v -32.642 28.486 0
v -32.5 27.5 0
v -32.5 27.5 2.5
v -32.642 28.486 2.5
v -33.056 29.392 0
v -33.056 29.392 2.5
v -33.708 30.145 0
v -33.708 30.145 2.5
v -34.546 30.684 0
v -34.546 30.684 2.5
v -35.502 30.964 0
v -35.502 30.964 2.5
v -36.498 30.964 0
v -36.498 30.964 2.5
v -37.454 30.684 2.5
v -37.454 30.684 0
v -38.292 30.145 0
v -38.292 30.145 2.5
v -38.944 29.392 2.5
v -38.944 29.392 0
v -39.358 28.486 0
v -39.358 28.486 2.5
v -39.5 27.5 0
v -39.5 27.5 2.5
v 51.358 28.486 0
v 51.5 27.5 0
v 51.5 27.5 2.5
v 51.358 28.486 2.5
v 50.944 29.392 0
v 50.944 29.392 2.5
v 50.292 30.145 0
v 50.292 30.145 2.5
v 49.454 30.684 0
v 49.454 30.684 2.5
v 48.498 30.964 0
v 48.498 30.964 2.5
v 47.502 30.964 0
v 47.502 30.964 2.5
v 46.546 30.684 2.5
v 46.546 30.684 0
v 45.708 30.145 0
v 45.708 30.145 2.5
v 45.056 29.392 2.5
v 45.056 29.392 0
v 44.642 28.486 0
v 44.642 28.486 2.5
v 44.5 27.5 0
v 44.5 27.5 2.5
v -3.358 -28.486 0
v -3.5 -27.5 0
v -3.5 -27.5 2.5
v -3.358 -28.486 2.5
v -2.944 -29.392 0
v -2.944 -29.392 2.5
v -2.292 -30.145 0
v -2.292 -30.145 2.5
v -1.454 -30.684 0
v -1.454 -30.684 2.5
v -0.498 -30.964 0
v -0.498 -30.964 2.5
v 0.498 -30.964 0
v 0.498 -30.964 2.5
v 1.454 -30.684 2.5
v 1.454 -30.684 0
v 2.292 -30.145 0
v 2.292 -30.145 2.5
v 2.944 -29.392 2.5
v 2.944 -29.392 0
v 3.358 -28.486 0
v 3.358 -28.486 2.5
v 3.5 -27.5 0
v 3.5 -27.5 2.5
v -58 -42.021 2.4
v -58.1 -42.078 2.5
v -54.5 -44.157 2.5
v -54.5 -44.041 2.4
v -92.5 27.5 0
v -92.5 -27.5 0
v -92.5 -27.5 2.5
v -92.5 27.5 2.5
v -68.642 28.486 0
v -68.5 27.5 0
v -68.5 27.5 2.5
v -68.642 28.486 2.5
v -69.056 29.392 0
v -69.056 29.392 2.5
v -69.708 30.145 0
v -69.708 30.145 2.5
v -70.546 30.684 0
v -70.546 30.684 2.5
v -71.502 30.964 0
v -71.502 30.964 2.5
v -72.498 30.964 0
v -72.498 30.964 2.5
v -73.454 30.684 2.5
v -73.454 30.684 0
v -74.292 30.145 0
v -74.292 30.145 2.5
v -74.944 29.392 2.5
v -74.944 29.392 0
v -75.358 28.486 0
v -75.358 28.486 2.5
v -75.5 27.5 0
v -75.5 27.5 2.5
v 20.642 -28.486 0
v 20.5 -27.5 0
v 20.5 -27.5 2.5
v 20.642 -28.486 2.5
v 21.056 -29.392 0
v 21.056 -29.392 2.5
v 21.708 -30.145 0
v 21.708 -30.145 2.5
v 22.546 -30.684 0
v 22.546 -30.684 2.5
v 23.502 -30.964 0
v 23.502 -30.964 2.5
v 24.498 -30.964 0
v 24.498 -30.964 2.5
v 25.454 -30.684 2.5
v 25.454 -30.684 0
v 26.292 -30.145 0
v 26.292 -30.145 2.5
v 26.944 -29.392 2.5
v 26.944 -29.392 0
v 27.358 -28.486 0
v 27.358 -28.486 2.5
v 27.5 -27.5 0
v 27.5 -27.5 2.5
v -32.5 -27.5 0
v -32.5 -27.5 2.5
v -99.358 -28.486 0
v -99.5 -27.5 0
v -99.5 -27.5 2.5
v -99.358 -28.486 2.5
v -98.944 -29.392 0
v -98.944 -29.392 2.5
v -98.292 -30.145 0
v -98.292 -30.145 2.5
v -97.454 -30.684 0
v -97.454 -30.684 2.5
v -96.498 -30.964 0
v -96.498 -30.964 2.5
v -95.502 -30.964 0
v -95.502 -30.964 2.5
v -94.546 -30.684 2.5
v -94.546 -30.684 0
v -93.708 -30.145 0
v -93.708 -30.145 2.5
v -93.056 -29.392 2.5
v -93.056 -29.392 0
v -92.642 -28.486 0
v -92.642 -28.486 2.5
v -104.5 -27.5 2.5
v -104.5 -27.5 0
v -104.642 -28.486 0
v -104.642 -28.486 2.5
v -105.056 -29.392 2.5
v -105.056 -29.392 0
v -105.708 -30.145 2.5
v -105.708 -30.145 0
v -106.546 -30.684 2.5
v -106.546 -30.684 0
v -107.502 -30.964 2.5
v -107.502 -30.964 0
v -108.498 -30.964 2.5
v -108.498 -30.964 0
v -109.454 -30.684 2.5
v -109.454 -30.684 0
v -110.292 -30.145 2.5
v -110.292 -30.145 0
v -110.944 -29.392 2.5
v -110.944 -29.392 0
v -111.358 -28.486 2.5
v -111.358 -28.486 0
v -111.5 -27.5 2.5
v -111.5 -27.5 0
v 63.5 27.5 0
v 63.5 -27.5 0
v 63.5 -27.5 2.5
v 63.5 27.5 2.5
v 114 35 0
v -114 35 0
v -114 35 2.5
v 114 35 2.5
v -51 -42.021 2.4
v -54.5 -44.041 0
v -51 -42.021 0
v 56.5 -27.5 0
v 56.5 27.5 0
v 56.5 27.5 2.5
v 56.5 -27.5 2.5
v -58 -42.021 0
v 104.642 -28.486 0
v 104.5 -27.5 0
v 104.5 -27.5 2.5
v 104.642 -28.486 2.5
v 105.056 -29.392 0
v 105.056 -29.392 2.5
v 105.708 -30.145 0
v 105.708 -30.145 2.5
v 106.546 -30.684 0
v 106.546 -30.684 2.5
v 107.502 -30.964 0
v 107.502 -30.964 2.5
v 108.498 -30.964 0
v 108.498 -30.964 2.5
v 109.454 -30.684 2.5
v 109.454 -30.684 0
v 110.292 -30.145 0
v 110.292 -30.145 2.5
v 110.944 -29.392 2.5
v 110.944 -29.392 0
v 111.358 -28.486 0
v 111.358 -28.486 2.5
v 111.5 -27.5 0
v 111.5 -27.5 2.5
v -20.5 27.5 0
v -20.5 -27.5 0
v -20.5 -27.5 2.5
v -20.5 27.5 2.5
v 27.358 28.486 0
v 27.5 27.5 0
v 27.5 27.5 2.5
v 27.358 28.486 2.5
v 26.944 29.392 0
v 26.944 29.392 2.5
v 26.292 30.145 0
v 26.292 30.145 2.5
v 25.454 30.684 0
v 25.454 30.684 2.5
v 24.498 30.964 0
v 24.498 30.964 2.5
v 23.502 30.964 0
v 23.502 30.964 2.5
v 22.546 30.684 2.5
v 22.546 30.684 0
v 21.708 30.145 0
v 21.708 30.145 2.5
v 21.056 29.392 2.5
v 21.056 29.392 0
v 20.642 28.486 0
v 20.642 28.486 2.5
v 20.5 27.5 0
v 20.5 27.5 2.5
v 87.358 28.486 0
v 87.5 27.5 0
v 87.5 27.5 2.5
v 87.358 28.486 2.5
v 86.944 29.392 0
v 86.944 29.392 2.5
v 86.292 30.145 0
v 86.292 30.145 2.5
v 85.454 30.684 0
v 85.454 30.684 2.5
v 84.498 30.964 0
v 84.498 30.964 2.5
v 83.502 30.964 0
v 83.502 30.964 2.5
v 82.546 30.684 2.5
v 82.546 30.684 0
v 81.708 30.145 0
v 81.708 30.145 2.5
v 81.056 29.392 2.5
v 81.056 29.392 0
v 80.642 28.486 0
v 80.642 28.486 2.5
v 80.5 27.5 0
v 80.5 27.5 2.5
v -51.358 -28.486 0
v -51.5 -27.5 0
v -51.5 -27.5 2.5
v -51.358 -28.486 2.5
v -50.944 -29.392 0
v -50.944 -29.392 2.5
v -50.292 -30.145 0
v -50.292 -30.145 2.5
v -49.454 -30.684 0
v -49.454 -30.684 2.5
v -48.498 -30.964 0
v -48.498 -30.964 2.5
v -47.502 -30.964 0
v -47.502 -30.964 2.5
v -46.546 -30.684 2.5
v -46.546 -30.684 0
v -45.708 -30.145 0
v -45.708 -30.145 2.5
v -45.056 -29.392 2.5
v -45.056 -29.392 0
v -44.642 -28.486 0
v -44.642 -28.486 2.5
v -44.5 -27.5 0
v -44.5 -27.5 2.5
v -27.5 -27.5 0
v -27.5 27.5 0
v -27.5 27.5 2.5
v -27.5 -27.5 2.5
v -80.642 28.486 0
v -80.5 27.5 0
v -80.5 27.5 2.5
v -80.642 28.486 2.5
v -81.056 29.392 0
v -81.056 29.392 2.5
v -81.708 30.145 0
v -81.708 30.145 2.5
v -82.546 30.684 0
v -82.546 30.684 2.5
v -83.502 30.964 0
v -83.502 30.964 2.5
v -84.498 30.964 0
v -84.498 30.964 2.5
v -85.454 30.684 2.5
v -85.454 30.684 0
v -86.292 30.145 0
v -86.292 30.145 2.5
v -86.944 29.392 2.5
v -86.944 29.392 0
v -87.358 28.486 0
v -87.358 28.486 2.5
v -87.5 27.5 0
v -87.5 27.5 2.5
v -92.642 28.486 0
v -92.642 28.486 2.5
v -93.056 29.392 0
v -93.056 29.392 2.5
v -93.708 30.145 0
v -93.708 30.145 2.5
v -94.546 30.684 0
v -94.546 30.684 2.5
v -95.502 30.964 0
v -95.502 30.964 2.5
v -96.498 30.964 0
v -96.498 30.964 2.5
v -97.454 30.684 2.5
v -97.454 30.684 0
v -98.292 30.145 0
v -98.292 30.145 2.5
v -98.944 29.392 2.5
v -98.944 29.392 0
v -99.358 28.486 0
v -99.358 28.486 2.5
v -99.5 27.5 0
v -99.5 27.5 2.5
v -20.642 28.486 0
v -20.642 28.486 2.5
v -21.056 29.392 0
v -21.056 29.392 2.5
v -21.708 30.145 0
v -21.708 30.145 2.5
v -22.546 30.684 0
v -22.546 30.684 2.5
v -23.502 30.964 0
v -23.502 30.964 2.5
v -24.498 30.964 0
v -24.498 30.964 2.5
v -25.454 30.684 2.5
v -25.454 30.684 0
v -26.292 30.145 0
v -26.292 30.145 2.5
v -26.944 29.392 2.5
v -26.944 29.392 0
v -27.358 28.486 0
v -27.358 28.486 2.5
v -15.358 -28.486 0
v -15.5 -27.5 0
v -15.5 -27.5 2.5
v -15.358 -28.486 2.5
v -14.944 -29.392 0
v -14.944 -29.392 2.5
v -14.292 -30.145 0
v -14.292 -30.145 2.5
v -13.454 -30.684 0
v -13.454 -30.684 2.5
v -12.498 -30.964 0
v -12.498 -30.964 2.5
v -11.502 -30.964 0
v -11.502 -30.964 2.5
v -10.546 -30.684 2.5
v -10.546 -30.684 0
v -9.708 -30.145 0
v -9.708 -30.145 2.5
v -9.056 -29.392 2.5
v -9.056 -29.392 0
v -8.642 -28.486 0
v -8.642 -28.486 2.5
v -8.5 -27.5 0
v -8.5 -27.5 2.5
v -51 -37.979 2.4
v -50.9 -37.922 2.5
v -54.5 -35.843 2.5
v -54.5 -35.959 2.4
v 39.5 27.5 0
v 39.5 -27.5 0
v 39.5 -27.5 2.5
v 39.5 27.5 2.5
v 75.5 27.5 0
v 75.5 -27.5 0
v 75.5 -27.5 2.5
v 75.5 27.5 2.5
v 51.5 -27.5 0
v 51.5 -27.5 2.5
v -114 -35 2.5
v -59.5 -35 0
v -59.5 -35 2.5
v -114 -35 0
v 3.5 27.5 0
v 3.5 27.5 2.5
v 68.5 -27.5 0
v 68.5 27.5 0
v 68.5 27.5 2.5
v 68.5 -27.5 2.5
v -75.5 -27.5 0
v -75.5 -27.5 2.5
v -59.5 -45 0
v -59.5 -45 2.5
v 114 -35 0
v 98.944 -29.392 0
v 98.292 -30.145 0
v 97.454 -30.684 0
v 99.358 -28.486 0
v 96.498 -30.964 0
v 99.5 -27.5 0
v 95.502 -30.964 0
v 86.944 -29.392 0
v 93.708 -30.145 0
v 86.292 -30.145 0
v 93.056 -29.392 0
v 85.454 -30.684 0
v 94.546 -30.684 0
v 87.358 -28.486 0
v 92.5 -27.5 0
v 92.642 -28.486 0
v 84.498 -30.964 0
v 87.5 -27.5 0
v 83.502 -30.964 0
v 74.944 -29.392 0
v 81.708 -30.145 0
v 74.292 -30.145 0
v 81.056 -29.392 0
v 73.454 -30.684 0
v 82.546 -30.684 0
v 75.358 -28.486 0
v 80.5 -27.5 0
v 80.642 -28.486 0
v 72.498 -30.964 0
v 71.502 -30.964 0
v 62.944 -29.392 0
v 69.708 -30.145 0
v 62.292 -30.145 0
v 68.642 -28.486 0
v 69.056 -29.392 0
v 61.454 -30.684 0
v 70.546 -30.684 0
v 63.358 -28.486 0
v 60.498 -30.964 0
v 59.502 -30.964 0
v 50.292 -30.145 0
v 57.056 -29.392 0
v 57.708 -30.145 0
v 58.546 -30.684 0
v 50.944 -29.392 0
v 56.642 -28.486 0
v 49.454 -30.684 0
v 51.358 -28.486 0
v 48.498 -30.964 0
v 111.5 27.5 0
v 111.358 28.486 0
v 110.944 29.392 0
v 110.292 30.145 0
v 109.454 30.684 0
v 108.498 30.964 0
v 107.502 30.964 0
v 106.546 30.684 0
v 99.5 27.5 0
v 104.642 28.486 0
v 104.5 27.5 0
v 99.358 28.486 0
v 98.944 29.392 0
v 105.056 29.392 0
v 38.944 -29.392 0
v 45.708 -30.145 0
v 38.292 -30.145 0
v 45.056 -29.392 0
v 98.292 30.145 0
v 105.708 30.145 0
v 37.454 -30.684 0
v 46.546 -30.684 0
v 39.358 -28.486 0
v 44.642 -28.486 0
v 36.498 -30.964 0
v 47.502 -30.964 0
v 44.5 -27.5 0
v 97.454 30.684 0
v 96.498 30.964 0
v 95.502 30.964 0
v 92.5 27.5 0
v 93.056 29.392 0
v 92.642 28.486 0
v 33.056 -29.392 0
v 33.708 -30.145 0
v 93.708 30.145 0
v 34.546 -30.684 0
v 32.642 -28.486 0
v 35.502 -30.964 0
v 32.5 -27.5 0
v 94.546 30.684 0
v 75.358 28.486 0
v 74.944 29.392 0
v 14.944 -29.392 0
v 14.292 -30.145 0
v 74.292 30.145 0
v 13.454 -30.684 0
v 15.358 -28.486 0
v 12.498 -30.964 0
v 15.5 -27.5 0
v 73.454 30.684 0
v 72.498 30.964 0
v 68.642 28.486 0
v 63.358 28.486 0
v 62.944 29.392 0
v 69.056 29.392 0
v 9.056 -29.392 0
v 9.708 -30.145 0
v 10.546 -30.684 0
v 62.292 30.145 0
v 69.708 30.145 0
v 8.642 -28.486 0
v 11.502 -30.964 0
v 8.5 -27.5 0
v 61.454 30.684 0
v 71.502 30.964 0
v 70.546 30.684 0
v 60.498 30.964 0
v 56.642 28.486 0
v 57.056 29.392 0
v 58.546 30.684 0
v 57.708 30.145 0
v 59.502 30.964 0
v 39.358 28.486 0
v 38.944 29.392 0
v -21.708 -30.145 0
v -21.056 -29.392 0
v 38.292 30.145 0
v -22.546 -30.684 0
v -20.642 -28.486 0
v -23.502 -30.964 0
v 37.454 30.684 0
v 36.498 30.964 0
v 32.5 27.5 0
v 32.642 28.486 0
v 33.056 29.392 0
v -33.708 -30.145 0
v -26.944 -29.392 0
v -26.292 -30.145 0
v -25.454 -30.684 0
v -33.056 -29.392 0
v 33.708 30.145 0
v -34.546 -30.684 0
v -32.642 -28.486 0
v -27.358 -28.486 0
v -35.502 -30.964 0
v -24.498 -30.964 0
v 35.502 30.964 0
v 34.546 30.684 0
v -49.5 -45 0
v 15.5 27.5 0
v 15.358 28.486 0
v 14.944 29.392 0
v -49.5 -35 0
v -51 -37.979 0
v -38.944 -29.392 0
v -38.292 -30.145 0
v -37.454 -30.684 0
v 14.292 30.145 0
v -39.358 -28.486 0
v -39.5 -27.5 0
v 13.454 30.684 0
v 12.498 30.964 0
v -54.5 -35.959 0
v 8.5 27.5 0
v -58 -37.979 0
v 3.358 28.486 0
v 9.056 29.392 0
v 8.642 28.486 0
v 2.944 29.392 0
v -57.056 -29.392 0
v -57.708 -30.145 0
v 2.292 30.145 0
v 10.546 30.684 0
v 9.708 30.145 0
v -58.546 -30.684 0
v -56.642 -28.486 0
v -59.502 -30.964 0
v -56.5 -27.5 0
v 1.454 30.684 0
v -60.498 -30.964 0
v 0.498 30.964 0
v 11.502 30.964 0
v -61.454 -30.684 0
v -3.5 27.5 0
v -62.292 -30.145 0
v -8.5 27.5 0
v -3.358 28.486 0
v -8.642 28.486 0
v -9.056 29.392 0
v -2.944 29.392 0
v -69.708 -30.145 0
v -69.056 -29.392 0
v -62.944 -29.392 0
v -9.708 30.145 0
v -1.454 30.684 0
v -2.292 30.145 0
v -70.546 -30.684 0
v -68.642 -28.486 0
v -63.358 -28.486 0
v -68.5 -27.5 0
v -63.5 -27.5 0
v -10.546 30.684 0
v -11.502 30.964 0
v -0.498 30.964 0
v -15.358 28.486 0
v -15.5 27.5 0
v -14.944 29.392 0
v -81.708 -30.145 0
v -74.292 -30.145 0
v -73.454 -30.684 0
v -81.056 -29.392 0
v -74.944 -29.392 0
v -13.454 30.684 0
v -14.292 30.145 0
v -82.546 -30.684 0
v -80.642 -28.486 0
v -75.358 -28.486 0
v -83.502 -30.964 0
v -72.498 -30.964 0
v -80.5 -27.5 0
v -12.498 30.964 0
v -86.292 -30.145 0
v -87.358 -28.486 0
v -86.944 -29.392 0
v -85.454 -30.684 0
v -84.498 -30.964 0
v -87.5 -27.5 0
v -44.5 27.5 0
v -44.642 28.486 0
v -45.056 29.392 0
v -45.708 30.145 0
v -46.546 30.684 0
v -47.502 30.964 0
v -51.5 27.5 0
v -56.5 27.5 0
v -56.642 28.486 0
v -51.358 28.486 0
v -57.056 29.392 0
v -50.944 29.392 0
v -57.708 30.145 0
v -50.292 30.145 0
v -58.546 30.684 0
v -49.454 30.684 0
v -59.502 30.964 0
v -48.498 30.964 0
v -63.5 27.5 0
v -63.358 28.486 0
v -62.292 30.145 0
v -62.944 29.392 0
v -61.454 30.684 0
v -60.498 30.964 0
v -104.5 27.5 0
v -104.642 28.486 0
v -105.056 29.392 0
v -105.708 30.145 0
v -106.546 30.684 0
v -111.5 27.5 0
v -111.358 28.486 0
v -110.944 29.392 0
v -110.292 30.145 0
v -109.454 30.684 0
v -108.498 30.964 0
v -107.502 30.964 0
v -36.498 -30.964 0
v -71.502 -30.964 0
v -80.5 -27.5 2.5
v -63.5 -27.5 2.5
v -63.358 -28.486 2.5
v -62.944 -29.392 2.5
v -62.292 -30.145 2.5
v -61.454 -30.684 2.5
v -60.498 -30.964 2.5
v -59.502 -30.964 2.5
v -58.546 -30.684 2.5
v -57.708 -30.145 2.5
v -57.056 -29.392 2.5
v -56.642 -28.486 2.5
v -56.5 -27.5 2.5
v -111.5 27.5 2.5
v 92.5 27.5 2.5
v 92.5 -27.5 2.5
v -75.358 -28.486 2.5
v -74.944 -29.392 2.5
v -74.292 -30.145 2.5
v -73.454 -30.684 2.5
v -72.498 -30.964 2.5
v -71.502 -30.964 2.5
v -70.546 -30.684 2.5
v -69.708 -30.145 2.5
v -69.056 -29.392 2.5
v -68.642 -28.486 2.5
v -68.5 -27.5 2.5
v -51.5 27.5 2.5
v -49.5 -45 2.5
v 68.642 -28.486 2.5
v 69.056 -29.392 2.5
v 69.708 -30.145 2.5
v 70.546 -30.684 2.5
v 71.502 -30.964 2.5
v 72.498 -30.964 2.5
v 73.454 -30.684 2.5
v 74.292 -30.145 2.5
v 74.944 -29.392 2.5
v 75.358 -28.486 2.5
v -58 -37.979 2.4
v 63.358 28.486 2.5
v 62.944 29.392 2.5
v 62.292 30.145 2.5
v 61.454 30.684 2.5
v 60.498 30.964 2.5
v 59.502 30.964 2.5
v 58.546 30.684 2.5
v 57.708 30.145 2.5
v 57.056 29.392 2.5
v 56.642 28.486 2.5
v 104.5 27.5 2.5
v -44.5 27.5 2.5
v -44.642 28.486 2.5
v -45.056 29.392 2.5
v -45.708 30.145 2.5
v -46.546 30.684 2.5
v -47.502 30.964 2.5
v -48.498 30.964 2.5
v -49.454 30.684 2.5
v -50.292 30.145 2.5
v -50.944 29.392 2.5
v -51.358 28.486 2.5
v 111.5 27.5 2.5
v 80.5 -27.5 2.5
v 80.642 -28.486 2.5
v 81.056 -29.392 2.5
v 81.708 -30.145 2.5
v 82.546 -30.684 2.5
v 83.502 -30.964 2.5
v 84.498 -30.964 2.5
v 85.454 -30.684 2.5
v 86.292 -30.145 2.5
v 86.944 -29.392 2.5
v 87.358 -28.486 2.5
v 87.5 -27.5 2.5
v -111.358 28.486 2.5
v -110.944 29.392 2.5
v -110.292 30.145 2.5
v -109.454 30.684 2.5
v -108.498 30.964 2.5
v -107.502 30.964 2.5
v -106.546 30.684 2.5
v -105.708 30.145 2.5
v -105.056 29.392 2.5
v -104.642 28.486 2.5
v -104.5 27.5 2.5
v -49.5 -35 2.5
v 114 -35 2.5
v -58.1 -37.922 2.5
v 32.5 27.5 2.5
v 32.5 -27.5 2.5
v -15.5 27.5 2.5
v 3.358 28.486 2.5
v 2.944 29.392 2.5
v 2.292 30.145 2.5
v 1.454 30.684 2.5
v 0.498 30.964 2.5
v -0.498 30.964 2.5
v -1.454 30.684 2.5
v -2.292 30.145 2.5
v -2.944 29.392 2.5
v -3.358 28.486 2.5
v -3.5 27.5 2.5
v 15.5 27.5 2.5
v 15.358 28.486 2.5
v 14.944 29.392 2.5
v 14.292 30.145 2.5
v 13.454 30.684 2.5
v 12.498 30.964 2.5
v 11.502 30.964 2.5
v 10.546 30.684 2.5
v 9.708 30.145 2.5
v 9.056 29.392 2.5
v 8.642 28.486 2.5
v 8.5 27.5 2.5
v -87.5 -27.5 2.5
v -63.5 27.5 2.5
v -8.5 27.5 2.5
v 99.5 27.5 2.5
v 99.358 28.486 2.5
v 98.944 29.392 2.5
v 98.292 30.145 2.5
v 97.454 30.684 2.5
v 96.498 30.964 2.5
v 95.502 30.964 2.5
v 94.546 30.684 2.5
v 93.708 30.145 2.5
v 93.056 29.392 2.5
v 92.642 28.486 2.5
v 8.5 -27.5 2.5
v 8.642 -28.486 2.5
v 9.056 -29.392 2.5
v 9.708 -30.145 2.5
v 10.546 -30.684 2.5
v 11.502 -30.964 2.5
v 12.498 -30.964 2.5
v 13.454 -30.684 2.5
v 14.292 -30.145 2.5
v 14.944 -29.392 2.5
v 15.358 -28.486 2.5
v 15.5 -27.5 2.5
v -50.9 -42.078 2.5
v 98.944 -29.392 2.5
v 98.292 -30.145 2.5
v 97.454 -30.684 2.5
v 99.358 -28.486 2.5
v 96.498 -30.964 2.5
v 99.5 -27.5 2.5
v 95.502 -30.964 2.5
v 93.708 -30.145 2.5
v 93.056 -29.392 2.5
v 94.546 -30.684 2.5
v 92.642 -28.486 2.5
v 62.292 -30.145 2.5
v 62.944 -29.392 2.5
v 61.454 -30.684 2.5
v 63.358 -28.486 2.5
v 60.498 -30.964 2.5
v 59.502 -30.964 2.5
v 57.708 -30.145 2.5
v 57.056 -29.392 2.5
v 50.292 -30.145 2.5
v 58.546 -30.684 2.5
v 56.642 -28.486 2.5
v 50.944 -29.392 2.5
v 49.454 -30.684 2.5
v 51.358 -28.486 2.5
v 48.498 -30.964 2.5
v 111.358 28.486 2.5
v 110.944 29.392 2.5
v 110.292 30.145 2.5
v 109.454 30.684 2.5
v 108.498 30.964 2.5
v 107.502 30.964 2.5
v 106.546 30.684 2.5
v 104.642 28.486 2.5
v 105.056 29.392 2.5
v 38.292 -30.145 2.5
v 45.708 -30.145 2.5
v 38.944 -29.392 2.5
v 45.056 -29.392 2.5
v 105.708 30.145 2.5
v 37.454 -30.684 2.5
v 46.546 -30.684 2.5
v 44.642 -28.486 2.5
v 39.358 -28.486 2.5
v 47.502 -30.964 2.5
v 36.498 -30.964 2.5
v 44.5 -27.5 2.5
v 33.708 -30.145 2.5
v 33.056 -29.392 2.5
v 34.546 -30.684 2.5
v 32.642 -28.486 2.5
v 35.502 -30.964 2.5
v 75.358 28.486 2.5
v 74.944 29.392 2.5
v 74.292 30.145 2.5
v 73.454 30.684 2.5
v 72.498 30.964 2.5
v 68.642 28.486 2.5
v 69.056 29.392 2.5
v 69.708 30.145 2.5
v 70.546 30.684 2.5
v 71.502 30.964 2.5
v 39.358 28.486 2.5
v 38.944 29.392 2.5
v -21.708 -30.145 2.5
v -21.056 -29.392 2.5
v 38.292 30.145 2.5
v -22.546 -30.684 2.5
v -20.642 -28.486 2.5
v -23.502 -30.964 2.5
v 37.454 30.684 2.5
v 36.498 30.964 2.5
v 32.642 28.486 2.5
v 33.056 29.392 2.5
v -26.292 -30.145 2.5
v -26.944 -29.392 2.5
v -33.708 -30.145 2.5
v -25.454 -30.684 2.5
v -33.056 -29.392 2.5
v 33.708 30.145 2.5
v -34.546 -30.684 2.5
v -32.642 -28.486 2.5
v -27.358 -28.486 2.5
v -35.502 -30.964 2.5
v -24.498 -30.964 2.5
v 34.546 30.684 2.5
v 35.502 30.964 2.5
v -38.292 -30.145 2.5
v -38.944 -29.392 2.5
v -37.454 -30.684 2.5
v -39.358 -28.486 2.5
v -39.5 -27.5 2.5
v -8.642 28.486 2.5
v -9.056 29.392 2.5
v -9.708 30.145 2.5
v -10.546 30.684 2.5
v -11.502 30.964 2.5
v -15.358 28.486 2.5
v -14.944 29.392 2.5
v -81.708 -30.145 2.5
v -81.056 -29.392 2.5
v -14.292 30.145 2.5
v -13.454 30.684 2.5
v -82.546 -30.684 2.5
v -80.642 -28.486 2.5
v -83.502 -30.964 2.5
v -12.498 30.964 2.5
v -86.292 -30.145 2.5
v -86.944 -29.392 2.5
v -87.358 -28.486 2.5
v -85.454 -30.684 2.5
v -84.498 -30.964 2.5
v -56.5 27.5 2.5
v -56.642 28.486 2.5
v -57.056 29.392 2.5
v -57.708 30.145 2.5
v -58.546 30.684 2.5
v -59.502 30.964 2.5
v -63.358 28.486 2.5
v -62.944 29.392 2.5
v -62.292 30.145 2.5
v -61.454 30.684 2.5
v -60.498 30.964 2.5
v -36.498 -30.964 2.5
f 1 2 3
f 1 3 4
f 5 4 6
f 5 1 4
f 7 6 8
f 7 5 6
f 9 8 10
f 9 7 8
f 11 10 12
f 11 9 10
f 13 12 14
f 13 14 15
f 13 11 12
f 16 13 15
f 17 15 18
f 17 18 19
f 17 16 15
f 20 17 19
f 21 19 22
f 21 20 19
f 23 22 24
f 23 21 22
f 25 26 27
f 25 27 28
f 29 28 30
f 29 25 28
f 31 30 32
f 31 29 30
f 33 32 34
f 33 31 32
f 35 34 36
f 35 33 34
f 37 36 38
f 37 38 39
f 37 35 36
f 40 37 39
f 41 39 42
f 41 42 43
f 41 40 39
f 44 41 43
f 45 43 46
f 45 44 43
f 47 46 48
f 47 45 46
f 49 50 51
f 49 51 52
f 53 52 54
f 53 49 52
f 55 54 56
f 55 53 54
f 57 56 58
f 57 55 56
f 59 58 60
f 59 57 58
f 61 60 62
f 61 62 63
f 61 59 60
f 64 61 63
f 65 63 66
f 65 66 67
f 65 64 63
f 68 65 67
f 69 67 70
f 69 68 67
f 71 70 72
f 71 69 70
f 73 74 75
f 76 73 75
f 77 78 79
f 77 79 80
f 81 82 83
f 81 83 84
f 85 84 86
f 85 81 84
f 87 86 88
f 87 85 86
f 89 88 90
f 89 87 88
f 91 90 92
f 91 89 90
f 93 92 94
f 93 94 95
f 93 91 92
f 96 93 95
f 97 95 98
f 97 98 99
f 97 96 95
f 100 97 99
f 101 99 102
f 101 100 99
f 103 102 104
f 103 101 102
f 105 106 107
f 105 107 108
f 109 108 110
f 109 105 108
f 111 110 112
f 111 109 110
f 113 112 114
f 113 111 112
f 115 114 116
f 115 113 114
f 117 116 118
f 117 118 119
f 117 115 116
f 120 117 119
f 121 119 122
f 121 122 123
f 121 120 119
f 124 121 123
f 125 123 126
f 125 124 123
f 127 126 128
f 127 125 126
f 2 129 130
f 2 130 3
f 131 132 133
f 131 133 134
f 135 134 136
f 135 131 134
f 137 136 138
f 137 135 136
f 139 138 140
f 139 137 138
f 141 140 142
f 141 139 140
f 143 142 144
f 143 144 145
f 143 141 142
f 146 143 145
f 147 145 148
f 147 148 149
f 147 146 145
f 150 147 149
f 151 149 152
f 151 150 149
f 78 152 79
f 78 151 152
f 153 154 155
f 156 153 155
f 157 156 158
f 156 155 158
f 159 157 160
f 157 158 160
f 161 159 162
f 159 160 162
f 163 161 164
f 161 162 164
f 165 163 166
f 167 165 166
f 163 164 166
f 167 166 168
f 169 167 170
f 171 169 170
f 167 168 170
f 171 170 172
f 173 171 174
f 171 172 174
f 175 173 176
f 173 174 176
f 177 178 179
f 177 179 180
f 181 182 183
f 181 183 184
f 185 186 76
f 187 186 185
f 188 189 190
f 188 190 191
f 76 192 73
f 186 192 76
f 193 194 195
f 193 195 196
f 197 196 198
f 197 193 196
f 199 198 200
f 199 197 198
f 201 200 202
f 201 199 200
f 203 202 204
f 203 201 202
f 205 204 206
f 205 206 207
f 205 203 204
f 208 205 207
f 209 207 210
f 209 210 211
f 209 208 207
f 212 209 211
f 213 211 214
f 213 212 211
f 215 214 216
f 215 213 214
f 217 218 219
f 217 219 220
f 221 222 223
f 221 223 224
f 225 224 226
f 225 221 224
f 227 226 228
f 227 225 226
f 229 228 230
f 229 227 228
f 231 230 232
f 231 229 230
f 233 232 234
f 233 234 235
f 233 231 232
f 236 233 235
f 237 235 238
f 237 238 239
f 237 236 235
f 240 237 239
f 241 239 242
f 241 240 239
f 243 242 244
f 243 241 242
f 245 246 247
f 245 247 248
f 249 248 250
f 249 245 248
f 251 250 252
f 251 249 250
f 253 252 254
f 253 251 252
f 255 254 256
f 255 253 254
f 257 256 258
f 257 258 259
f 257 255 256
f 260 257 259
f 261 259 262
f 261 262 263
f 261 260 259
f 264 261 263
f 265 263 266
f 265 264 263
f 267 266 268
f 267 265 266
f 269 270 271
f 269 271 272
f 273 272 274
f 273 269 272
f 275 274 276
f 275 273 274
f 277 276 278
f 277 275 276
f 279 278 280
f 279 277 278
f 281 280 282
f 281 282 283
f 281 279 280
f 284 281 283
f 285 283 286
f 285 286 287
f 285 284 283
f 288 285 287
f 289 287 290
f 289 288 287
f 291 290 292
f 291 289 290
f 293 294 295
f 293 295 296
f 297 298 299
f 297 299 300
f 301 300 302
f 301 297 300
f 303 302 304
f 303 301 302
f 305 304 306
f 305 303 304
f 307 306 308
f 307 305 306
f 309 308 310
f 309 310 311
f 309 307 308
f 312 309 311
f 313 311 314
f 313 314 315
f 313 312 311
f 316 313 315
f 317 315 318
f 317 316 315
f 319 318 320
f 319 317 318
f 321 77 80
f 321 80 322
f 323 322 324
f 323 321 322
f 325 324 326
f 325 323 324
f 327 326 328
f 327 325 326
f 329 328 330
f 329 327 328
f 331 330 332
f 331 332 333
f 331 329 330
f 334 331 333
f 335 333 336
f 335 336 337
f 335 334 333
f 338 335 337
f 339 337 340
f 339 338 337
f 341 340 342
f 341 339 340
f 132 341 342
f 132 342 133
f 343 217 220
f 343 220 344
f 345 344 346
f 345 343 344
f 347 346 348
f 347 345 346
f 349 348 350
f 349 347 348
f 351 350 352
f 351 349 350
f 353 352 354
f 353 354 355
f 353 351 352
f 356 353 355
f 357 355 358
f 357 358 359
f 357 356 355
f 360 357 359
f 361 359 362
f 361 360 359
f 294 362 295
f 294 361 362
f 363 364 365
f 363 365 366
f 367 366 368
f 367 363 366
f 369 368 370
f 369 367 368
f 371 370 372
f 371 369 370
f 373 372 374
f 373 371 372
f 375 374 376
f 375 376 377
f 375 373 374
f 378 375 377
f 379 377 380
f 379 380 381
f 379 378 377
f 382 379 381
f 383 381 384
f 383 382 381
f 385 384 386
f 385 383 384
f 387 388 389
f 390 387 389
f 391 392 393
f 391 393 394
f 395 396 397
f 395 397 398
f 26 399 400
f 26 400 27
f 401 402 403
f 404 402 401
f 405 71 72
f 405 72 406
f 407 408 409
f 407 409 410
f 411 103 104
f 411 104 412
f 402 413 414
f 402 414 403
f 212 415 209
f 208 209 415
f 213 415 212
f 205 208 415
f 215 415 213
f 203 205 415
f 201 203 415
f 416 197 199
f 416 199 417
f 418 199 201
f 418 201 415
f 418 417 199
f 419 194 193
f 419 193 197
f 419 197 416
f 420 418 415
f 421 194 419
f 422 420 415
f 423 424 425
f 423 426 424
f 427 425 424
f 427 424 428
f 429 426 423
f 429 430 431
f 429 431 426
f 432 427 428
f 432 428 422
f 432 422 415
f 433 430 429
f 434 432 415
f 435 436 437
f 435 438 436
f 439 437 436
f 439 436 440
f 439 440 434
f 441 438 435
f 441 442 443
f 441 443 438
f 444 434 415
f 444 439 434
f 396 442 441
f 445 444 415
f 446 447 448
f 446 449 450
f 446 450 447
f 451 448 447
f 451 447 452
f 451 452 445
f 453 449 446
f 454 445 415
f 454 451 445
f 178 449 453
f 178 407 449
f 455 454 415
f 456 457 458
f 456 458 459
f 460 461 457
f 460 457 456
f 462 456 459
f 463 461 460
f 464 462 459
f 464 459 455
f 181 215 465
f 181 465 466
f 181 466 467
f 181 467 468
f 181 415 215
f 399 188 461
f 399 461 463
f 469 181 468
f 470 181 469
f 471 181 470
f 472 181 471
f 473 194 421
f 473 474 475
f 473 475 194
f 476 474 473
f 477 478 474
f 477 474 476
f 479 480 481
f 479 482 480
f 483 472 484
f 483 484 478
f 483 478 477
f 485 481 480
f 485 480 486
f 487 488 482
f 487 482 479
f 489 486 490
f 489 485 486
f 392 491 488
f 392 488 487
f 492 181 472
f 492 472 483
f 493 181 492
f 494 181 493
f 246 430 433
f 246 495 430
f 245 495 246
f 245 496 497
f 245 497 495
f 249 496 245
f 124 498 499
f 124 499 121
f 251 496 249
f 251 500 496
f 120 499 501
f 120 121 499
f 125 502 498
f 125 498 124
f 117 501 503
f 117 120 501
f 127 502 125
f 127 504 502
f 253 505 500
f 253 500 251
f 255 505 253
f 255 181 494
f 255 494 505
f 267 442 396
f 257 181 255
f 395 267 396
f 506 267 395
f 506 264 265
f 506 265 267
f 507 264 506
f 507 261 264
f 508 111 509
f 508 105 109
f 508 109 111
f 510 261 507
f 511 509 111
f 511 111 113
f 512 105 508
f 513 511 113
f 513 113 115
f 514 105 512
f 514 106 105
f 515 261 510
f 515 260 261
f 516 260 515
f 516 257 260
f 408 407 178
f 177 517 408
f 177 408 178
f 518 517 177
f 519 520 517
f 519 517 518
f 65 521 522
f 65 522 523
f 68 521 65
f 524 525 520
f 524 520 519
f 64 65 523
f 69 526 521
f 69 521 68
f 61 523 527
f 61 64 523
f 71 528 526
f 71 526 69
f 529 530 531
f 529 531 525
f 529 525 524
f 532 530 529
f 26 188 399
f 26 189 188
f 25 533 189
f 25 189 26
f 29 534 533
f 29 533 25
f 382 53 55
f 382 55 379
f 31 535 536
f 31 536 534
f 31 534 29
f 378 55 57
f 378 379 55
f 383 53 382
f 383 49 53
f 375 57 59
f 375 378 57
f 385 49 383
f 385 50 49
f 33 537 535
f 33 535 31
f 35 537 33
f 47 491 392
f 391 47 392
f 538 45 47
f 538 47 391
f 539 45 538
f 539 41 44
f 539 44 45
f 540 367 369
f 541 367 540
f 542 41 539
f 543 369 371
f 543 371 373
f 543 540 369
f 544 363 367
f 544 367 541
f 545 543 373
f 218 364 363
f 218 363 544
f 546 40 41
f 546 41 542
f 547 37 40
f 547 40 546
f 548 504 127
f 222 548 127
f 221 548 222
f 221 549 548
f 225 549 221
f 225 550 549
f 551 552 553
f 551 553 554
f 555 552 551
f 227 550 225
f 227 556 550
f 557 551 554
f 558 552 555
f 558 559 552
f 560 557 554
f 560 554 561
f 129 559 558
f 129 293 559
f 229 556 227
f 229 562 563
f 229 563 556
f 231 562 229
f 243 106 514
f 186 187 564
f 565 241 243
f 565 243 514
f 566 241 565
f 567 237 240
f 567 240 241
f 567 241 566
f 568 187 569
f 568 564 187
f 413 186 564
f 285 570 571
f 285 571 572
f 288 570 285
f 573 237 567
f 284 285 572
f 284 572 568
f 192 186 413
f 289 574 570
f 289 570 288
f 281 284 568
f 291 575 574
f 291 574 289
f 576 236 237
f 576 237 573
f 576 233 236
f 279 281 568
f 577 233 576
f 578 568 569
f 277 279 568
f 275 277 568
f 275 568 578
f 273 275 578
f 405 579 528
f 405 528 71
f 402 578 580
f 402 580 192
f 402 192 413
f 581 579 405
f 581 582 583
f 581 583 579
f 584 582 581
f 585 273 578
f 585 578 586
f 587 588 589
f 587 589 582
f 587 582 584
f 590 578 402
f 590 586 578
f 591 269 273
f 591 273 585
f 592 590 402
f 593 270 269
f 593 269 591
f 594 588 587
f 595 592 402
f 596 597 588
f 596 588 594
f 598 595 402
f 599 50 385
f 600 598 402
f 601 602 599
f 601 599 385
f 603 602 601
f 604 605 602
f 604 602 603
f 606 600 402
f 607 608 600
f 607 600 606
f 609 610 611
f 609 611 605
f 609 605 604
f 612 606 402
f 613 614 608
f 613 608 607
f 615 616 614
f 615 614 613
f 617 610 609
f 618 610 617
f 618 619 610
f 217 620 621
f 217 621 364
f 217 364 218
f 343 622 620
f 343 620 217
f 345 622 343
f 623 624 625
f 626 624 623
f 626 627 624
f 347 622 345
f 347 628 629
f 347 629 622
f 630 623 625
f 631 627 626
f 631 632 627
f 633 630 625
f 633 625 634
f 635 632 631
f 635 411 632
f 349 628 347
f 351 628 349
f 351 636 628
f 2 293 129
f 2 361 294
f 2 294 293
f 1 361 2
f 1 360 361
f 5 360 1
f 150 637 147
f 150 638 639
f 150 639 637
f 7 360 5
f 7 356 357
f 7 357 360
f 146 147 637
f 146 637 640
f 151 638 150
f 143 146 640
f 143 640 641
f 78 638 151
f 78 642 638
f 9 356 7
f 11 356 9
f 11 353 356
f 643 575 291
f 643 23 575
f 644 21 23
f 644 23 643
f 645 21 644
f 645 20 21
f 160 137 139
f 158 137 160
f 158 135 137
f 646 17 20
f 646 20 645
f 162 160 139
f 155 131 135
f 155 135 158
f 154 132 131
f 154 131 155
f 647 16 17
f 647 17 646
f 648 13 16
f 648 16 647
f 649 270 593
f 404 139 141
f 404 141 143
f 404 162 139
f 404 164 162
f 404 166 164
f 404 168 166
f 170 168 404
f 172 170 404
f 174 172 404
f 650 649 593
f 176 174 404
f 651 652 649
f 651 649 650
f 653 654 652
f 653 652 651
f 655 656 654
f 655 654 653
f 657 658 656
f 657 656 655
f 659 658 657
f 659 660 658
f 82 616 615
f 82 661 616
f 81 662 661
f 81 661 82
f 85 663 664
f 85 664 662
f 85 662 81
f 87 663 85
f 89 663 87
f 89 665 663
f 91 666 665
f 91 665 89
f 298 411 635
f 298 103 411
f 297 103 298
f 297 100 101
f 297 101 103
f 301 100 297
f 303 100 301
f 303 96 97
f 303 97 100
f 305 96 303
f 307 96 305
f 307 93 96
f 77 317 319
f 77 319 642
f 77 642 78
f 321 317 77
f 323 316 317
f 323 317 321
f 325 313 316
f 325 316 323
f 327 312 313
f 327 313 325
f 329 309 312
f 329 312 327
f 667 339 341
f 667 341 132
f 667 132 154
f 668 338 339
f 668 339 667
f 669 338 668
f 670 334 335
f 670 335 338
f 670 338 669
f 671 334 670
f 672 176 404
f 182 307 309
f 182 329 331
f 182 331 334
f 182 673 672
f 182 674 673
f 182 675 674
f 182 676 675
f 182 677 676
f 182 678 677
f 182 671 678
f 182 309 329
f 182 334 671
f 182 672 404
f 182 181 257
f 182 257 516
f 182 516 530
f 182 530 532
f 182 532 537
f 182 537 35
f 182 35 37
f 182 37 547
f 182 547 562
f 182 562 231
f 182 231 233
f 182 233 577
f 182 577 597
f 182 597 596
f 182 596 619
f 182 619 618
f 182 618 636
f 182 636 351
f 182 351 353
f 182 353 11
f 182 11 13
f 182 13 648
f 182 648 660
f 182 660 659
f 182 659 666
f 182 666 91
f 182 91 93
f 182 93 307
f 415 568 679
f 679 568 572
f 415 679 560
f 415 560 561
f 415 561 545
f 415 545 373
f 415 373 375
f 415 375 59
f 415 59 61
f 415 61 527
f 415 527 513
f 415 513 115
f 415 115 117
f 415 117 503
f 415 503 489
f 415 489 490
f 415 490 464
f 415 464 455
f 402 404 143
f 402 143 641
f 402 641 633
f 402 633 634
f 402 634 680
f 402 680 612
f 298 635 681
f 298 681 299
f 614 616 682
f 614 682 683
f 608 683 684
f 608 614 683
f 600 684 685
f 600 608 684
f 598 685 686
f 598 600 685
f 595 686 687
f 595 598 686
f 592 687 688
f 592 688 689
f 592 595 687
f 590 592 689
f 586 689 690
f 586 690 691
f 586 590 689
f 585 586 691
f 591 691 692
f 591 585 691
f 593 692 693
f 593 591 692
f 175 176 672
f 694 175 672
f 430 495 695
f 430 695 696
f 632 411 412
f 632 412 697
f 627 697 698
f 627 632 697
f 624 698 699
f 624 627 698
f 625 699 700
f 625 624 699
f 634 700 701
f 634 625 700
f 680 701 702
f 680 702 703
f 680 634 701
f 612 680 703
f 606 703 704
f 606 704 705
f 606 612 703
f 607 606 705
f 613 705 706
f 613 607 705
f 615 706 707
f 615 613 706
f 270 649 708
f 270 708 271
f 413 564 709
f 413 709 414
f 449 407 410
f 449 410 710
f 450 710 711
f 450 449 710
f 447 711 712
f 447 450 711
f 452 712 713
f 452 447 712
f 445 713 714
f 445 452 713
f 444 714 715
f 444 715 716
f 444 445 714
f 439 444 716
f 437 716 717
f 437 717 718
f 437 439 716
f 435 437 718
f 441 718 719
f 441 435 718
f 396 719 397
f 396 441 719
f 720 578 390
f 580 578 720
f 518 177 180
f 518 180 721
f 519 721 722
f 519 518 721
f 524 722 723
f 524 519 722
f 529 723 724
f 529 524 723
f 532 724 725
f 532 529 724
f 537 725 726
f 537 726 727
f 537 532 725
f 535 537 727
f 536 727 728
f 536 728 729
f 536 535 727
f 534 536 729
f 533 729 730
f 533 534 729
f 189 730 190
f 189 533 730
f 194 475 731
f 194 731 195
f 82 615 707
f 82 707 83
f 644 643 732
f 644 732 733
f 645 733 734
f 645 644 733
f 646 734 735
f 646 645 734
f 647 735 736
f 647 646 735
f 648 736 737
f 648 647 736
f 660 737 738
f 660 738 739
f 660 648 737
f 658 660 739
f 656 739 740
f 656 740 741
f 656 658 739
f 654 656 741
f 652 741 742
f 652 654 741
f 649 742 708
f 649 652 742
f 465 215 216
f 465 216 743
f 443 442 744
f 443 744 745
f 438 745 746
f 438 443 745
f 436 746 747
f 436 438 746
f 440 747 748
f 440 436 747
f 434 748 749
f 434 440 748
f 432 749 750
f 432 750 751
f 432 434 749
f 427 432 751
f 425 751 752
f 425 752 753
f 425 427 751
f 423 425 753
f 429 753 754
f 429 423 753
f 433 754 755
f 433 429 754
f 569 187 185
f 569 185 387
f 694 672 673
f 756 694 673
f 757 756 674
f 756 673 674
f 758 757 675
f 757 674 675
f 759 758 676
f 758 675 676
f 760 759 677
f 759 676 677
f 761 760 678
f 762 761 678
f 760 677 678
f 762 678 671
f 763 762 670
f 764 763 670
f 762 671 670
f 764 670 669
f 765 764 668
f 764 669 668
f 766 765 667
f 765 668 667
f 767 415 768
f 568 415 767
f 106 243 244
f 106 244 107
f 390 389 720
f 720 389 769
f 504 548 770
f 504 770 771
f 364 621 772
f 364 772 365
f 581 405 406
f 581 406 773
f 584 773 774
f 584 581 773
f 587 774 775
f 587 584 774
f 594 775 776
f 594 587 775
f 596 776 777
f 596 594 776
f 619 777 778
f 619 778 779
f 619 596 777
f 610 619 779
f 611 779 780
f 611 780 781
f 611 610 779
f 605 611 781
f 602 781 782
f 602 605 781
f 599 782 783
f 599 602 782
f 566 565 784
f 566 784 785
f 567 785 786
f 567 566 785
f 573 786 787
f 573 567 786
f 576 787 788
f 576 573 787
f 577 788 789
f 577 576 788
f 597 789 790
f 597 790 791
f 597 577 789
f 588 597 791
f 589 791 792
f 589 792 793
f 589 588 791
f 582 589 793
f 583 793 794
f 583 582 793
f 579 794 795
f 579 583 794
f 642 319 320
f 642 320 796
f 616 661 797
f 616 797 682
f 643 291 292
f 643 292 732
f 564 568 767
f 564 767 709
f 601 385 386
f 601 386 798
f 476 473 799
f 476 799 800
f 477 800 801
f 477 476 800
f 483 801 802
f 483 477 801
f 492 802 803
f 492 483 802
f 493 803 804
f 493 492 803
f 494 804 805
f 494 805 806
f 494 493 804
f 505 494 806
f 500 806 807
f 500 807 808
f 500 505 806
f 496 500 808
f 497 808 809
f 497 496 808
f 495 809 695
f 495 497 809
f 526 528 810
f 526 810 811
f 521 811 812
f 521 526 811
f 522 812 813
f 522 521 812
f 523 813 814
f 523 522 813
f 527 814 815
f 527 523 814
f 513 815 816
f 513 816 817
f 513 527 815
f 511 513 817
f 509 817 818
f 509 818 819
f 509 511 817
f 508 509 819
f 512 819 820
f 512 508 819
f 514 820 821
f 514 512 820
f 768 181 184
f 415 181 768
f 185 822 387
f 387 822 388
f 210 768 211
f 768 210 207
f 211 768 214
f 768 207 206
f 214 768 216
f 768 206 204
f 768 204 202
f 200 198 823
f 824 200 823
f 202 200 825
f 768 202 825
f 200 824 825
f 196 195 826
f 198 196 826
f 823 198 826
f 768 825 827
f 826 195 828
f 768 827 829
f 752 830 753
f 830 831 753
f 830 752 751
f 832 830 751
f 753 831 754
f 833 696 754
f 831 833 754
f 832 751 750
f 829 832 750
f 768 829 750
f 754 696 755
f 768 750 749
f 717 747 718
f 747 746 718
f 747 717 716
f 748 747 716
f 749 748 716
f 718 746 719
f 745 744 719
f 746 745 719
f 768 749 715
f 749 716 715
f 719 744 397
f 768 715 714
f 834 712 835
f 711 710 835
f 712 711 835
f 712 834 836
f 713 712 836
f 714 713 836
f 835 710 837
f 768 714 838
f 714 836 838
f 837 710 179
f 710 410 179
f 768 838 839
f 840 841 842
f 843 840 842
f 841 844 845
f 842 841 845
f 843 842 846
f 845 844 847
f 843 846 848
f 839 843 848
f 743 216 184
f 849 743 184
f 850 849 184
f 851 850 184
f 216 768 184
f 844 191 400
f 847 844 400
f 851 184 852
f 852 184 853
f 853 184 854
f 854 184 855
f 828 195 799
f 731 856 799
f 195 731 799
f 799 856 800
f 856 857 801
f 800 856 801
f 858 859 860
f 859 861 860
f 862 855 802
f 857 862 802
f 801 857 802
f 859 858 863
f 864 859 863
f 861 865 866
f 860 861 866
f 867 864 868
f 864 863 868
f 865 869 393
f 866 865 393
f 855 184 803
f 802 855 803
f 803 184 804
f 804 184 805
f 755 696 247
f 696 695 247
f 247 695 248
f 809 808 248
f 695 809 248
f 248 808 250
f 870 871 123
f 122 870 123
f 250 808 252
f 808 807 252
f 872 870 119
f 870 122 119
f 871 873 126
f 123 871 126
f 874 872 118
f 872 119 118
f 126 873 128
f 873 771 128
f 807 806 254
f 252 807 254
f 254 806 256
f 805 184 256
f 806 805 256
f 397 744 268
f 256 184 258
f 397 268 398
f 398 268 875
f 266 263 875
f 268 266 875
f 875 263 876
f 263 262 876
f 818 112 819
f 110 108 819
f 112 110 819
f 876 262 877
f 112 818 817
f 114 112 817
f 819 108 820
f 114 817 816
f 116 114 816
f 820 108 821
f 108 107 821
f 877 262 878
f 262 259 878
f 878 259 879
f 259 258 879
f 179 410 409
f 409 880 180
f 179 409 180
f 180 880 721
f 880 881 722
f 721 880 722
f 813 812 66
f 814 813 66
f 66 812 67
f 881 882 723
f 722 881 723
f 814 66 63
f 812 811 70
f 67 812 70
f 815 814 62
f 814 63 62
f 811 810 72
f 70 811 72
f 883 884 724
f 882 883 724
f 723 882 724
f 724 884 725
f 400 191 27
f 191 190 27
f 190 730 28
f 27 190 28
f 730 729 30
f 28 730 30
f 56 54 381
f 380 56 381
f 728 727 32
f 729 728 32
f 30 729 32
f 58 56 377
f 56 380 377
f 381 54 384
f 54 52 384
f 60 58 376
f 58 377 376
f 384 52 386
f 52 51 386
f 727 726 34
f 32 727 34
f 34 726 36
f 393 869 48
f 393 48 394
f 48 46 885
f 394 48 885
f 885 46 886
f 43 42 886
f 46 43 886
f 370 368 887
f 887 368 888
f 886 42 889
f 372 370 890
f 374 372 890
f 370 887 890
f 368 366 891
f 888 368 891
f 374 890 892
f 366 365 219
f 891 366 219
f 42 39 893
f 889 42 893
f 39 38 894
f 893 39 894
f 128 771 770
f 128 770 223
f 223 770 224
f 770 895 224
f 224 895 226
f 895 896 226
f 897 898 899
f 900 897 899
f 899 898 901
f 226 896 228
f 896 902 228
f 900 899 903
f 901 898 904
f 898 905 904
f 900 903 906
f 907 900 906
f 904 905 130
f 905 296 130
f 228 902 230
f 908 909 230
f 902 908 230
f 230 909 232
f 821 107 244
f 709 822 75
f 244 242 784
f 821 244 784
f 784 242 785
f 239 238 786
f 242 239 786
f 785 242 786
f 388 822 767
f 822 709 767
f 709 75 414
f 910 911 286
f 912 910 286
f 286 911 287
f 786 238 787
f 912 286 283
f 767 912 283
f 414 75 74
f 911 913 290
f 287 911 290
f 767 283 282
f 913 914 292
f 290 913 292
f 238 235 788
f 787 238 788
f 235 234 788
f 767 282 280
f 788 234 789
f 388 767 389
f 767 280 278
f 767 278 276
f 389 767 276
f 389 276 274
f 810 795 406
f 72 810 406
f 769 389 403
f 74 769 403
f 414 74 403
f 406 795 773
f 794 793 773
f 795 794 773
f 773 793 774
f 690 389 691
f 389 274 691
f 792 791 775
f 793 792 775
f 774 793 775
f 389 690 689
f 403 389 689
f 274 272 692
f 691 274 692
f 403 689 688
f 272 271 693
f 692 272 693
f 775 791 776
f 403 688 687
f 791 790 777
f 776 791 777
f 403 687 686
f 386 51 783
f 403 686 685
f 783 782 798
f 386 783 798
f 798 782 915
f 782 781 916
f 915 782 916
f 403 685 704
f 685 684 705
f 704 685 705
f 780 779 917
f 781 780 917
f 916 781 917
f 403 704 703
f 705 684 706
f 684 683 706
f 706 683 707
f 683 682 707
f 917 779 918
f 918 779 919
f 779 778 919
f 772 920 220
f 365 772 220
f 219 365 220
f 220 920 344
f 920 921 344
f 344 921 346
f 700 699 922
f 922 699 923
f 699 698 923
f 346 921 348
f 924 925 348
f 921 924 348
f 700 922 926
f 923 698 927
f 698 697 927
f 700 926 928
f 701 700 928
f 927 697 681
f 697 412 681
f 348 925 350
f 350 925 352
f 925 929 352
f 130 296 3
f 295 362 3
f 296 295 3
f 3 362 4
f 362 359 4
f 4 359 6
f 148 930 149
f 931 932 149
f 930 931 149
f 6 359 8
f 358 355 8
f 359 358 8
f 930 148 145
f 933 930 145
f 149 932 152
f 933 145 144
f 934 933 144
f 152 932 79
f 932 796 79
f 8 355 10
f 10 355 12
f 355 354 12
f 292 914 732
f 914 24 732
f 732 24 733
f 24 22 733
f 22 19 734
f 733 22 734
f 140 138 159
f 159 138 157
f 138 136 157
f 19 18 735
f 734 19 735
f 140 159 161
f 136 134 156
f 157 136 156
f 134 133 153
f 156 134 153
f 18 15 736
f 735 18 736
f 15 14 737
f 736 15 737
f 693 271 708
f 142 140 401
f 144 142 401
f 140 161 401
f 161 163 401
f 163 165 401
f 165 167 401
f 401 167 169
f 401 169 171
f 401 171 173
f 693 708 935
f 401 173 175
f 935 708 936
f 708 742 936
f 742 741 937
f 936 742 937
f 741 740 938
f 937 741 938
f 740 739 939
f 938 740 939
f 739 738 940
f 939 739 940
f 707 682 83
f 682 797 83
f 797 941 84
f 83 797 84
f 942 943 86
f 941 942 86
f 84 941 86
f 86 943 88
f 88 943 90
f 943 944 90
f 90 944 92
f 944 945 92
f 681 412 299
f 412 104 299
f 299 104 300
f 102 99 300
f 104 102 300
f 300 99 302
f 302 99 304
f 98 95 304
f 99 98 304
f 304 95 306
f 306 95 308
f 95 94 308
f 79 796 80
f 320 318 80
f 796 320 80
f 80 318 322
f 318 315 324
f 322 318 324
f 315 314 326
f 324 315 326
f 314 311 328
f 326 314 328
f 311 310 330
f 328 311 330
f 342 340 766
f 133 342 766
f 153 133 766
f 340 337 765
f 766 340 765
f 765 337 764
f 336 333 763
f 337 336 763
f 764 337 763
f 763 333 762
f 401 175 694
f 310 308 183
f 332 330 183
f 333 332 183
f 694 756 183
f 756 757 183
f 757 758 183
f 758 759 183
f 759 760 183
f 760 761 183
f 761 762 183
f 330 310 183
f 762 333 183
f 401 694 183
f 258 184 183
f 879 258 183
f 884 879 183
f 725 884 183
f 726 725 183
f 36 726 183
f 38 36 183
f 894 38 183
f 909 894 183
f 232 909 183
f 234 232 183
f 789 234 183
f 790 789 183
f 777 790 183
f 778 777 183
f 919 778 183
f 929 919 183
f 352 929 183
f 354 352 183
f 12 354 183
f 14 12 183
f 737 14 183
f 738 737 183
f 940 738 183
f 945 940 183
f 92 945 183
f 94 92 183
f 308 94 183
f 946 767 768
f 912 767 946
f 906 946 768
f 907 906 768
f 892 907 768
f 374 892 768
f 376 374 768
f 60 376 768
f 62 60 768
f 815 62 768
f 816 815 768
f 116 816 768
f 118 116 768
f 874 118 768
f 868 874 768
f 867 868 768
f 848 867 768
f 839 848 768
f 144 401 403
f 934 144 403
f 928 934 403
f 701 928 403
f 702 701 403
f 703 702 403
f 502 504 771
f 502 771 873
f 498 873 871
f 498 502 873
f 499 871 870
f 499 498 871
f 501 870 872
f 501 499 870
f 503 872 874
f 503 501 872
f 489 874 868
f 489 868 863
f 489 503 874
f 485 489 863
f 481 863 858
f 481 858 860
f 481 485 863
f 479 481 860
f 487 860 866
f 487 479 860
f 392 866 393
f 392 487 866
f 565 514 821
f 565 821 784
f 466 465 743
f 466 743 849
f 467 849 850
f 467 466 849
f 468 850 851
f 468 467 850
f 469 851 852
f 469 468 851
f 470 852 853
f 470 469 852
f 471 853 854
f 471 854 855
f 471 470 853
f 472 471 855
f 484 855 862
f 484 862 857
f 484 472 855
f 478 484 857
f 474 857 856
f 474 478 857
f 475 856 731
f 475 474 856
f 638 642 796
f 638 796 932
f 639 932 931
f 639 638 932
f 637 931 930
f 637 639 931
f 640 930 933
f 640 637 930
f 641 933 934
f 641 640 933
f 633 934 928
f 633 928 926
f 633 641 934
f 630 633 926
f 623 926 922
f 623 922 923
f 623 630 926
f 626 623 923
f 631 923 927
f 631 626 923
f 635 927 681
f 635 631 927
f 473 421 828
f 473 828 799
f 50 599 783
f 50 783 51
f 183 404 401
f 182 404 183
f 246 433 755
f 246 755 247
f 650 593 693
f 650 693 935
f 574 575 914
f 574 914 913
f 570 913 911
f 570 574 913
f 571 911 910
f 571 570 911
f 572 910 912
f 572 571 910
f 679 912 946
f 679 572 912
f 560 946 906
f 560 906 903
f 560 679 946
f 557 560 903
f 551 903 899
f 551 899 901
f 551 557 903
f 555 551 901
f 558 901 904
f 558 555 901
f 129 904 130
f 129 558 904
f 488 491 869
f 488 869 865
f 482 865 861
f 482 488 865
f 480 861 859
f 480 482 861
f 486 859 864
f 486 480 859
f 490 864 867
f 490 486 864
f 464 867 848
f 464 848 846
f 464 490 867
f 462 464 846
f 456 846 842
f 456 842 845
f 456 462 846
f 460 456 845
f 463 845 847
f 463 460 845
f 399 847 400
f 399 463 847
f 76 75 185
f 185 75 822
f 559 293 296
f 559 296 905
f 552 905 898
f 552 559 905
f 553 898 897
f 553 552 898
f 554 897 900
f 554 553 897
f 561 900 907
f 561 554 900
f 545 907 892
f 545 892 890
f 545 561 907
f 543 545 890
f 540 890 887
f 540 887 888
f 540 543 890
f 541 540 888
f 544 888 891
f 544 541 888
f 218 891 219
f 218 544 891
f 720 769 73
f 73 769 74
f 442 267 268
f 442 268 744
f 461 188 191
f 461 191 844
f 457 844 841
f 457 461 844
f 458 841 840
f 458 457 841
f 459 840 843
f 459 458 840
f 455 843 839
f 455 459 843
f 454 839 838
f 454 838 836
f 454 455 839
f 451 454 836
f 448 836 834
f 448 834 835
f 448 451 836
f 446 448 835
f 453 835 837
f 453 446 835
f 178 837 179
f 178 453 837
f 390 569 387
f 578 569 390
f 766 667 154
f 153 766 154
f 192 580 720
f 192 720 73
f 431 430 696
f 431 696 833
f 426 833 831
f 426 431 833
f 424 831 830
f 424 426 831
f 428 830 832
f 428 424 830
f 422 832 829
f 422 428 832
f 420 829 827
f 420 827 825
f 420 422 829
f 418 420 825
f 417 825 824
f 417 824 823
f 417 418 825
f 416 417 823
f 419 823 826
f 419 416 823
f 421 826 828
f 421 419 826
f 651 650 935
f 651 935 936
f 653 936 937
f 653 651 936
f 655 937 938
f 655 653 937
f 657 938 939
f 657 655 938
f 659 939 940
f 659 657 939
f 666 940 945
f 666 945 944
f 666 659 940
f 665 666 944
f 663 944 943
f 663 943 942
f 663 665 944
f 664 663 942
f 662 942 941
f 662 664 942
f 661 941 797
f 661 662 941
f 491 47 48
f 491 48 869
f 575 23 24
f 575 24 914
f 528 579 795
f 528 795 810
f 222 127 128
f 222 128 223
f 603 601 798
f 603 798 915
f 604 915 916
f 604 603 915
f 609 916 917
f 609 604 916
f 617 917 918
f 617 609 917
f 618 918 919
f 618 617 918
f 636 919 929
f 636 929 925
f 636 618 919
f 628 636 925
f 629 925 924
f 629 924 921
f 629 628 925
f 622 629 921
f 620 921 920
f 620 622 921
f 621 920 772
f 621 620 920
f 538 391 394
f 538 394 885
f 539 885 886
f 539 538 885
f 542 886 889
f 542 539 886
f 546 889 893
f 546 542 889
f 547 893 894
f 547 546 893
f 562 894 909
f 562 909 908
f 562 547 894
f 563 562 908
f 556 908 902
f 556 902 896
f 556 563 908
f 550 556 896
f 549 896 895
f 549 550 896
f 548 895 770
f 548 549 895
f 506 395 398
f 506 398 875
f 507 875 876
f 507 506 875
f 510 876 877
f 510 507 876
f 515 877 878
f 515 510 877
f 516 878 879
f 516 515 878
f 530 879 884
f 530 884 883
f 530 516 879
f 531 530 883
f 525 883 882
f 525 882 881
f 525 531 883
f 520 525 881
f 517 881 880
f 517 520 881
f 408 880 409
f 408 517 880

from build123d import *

# Parameters (mm, degrees)
BOSS_EXTRU_1_DEPTH = 2.5
CHANFREIN1_SIZE    = 0.1


with BuildPart() as part:
    # Esquisse1 → Boss.-Extru.1 (new body)
    with BuildSketch(Plane.XY):
        Polygon((-114, 35), (114, 35), (114, -35), (-49.5, -35), (-49.5, -45), (-59.5, -45), (-59.5, -35), (-114, -35), align=None)
        with BuildLine():
            Line((-111.5, -27.5), (-111.5, 27.5))
            ThreePointArc((-111.5, 27.5), (-108, 31), (-104.5, 27.5))
            Line((-104.5, 27.5), (-104.5, -27.5))
            ThreePointArc((-104.5, -27.5), (-108, -31), (-111.5, -27.5))
        make_face(mode=Mode.SUBTRACT)
        with BuildLine():
            Line((-92.5, -27.5), (-92.5, 27.5))
            ThreePointArc((-92.5, 27.5), (-96, 31), (-99.5, 27.5))
            Line((-99.5, 27.5), (-99.5, -27.5))
            ThreePointArc((-99.5, -27.5), (-96, -31), (-92.5, -27.5))
        make_face(mode=Mode.SUBTRACT)
        with BuildLine():
            Line((-80.5, -27.5), (-80.5, 27.5))
            ThreePointArc((-80.5, 27.5), (-84, 31), (-87.5, 27.5))
            Line((-87.5, 27.5), (-87.5, -27.5))
            ThreePointArc((-87.5, -27.5), (-84, -31), (-80.5, -27.5))
        make_face(mode=Mode.SUBTRACT)
        with BuildLine():
            Line((-68.5, -27.5), (-68.5, 27.5))
            ThreePointArc((-68.5, 27.5), (-72, 31), (-75.5, 27.5))
            Line((-75.5, 27.5), (-75.5, -27.5))
            ThreePointArc((-75.5, -27.5), (-72, -31), (-68.5, -27.5))
        make_face(mode=Mode.SUBTRACT)
        with BuildLine():
            Line((-56.5, -27.5), (-56.5, 27.5))
            ThreePointArc((-56.5, 27.5), (-60, 31), (-63.5, 27.5))
            Line((-63.5, 27.5), (-63.5, -27.5))
            ThreePointArc((-63.5, -27.5), (-60, -31), (-56.5, -27.5))
        make_face(mode=Mode.SUBTRACT)
        with BuildLine():
            Line((-44.5, -27.5), (-44.5, 27.5))
            ThreePointArc((-44.5, 27.5), (-48, 31), (-51.5, 27.5))
            Line((-51.5, 27.5), (-51.5, -27.5))
            ThreePointArc((-51.5, -27.5), (-48, -31), (-44.5, -27.5))
        make_face(mode=Mode.SUBTRACT)
        with BuildLine():
            Line((-32.5, -27.5), (-32.5, 27.5))
            ThreePointArc((-32.5, 27.5), (-36, 31), (-39.5, 27.5))
            Line((-39.5, 27.5), (-39.5, -27.5))
            ThreePointArc((-39.5, -27.5), (-36, -31), (-32.5, -27.5))
        make_face(mode=Mode.SUBTRACT)
        with BuildLine():
            Line((-20.5, -27.5), (-20.5, 27.5))
            ThreePointArc((-20.5, 27.5), (-24, 31), (-27.5, 27.5))
            Line((-27.5, 27.5), (-27.5, -27.5))
            ThreePointArc((-27.5, -27.5), (-24, -31), (-20.5, -27.5))
        make_face(mode=Mode.SUBTRACT)
        with BuildLine():
            Line((-8.5, -27.5), (-8.5, 27.5))
            ThreePointArc((-8.5, 27.5), (-12, 31), (-15.5, 27.5))
            Line((-15.5, 27.5), (-15.5, -27.5))
            ThreePointArc((-15.5, -27.5), (-12, -31), (-8.5, -27.5))
        make_face(mode=Mode.SUBTRACT)
        with BuildLine():
            Line((3.5, -27.5), (3.5, 27.5))
            ThreePointArc((3.5, 27.5), (0, 31), (-3.5, 27.5))
            Line((-3.5, 27.5), (-3.5, -27.5))
            ThreePointArc((-3.5, -27.5), (0, -31), (3.5, -27.5))
        make_face(mode=Mode.SUBTRACT)
        with BuildLine():
            Line((15.5, -27.5), (15.5, 27.5))
            ThreePointArc((15.5, 27.5), (12, 31), (8.5, 27.5))
            Line((8.5, 27.5), (8.5, -27.5))
            ThreePointArc((8.5, -27.5), (12, -31), (15.5, -27.5))
        make_face(mode=Mode.SUBTRACT)
        with BuildLine():
            Line((27.5, -27.5), (27.5, 27.5))
            ThreePointArc((27.5, 27.5), (24, 31), (20.5, 27.5))
            Line((20.5, 27.5), (20.5, -27.5))
            ThreePointArc((20.5, -27.5), (24, -31), (27.5, -27.5))
        make_face(mode=Mode.SUBTRACT)
        with BuildLine():
            Line((39.5, -27.5), (39.5, 27.5))
            ThreePointArc((39.5, 27.5), (36, 31), (32.5, 27.5))
            Line((32.5, 27.5), (32.5, -27.5))
            ThreePointArc((32.5, -27.5), (36, -31), (39.5, -27.5))
        make_face(mode=Mode.SUBTRACT)
        with BuildLine():
            Line((51.5, -27.5), (51.5, 27.5))
            ThreePointArc((51.5, 27.5), (48, 31), (44.5, 27.5))
            Line((44.5, 27.5), (44.5, -27.5))
            ThreePointArc((44.5, -27.5), (48, -31), (51.5, -27.5))
        make_face(mode=Mode.SUBTRACT)
        with BuildLine():
            Line((63.5, -27.5), (63.5, 27.5))
            ThreePointArc((63.5, 27.5), (60, 31), (56.5, 27.5))
            Line((56.5, 27.5), (56.5, -27.5))
            ThreePointArc((56.5, -27.5), (60, -31), (63.5, -27.5))
        make_face(mode=Mode.SUBTRACT)
        with BuildLine():
            Line((75.5, -27.5), (75.5, 27.5))
            ThreePointArc((75.5, 27.5), (72, 31), (68.5, 27.5))
            Line((68.5, 27.5), (68.5, -27.5))
            ThreePointArc((68.5, -27.5), (72, -31), (75.5, -27.5))
        make_face(mode=Mode.SUBTRACT)
        with BuildLine():
            Line((87.5, -27.5), (87.5, 27.5))
            ThreePointArc((87.5, 27.5), (84, 31), (80.5, 27.5))
            Line((80.5, 27.5), (80.5, -27.5))
            ThreePointArc((80.5, -27.5), (84, -31), (87.5, -27.5))
        make_face(mode=Mode.SUBTRACT)
        with BuildLine():
            Line((99.5, -27.5), (99.5, 27.5))
            ThreePointArc((99.5, 27.5), (96, 31), (92.5, 27.5))
            Line((92.5, 27.5), (92.5, -27.5))
            ThreePointArc((92.5, -27.5), (96, -31), (99.5, -27.5))
        make_face(mode=Mode.SUBTRACT)
        with BuildLine():
            Line((111.5, -27.5), (111.5, 27.5))
            ThreePointArc((111.5, 27.5), (108, 31), (104.5, 27.5))
            Line((104.5, 27.5), (104.5, -27.5))
            ThreePointArc((104.5, -27.5), (108, -31), (111.5, -27.5))
        make_face(mode=Mode.SUBTRACT)
        Polygon((-51, -42.020725942), (-51, -37.979274058), (-54.5, -35.958548116), (-58, -37.979274058), (-58, -42.020725942), (-54.5, -44.041451884), align=None, mode=Mode.SUBTRACT)
    extrude(amount=BOSS_EXTRU_1_DEPTH)

    # Chanfrein1
    chanfrein1_edges = [part.edges().sort_by_distance(p)[0] for p in [
        (-52.75, -43.031088913, 2.5),
        (-51, -40, 2.5),
        (-52.75, -36.968911087, 2.5),
        (-56.25, -36.968911087, 2.5),
        (-58, -40, 2.5),
        (-56.25, -43.031088913, 2.5),
    ]]
    chamfer(chanfrein1_edges, length=CHANFREIN1_SIZE)


solid = part.part
